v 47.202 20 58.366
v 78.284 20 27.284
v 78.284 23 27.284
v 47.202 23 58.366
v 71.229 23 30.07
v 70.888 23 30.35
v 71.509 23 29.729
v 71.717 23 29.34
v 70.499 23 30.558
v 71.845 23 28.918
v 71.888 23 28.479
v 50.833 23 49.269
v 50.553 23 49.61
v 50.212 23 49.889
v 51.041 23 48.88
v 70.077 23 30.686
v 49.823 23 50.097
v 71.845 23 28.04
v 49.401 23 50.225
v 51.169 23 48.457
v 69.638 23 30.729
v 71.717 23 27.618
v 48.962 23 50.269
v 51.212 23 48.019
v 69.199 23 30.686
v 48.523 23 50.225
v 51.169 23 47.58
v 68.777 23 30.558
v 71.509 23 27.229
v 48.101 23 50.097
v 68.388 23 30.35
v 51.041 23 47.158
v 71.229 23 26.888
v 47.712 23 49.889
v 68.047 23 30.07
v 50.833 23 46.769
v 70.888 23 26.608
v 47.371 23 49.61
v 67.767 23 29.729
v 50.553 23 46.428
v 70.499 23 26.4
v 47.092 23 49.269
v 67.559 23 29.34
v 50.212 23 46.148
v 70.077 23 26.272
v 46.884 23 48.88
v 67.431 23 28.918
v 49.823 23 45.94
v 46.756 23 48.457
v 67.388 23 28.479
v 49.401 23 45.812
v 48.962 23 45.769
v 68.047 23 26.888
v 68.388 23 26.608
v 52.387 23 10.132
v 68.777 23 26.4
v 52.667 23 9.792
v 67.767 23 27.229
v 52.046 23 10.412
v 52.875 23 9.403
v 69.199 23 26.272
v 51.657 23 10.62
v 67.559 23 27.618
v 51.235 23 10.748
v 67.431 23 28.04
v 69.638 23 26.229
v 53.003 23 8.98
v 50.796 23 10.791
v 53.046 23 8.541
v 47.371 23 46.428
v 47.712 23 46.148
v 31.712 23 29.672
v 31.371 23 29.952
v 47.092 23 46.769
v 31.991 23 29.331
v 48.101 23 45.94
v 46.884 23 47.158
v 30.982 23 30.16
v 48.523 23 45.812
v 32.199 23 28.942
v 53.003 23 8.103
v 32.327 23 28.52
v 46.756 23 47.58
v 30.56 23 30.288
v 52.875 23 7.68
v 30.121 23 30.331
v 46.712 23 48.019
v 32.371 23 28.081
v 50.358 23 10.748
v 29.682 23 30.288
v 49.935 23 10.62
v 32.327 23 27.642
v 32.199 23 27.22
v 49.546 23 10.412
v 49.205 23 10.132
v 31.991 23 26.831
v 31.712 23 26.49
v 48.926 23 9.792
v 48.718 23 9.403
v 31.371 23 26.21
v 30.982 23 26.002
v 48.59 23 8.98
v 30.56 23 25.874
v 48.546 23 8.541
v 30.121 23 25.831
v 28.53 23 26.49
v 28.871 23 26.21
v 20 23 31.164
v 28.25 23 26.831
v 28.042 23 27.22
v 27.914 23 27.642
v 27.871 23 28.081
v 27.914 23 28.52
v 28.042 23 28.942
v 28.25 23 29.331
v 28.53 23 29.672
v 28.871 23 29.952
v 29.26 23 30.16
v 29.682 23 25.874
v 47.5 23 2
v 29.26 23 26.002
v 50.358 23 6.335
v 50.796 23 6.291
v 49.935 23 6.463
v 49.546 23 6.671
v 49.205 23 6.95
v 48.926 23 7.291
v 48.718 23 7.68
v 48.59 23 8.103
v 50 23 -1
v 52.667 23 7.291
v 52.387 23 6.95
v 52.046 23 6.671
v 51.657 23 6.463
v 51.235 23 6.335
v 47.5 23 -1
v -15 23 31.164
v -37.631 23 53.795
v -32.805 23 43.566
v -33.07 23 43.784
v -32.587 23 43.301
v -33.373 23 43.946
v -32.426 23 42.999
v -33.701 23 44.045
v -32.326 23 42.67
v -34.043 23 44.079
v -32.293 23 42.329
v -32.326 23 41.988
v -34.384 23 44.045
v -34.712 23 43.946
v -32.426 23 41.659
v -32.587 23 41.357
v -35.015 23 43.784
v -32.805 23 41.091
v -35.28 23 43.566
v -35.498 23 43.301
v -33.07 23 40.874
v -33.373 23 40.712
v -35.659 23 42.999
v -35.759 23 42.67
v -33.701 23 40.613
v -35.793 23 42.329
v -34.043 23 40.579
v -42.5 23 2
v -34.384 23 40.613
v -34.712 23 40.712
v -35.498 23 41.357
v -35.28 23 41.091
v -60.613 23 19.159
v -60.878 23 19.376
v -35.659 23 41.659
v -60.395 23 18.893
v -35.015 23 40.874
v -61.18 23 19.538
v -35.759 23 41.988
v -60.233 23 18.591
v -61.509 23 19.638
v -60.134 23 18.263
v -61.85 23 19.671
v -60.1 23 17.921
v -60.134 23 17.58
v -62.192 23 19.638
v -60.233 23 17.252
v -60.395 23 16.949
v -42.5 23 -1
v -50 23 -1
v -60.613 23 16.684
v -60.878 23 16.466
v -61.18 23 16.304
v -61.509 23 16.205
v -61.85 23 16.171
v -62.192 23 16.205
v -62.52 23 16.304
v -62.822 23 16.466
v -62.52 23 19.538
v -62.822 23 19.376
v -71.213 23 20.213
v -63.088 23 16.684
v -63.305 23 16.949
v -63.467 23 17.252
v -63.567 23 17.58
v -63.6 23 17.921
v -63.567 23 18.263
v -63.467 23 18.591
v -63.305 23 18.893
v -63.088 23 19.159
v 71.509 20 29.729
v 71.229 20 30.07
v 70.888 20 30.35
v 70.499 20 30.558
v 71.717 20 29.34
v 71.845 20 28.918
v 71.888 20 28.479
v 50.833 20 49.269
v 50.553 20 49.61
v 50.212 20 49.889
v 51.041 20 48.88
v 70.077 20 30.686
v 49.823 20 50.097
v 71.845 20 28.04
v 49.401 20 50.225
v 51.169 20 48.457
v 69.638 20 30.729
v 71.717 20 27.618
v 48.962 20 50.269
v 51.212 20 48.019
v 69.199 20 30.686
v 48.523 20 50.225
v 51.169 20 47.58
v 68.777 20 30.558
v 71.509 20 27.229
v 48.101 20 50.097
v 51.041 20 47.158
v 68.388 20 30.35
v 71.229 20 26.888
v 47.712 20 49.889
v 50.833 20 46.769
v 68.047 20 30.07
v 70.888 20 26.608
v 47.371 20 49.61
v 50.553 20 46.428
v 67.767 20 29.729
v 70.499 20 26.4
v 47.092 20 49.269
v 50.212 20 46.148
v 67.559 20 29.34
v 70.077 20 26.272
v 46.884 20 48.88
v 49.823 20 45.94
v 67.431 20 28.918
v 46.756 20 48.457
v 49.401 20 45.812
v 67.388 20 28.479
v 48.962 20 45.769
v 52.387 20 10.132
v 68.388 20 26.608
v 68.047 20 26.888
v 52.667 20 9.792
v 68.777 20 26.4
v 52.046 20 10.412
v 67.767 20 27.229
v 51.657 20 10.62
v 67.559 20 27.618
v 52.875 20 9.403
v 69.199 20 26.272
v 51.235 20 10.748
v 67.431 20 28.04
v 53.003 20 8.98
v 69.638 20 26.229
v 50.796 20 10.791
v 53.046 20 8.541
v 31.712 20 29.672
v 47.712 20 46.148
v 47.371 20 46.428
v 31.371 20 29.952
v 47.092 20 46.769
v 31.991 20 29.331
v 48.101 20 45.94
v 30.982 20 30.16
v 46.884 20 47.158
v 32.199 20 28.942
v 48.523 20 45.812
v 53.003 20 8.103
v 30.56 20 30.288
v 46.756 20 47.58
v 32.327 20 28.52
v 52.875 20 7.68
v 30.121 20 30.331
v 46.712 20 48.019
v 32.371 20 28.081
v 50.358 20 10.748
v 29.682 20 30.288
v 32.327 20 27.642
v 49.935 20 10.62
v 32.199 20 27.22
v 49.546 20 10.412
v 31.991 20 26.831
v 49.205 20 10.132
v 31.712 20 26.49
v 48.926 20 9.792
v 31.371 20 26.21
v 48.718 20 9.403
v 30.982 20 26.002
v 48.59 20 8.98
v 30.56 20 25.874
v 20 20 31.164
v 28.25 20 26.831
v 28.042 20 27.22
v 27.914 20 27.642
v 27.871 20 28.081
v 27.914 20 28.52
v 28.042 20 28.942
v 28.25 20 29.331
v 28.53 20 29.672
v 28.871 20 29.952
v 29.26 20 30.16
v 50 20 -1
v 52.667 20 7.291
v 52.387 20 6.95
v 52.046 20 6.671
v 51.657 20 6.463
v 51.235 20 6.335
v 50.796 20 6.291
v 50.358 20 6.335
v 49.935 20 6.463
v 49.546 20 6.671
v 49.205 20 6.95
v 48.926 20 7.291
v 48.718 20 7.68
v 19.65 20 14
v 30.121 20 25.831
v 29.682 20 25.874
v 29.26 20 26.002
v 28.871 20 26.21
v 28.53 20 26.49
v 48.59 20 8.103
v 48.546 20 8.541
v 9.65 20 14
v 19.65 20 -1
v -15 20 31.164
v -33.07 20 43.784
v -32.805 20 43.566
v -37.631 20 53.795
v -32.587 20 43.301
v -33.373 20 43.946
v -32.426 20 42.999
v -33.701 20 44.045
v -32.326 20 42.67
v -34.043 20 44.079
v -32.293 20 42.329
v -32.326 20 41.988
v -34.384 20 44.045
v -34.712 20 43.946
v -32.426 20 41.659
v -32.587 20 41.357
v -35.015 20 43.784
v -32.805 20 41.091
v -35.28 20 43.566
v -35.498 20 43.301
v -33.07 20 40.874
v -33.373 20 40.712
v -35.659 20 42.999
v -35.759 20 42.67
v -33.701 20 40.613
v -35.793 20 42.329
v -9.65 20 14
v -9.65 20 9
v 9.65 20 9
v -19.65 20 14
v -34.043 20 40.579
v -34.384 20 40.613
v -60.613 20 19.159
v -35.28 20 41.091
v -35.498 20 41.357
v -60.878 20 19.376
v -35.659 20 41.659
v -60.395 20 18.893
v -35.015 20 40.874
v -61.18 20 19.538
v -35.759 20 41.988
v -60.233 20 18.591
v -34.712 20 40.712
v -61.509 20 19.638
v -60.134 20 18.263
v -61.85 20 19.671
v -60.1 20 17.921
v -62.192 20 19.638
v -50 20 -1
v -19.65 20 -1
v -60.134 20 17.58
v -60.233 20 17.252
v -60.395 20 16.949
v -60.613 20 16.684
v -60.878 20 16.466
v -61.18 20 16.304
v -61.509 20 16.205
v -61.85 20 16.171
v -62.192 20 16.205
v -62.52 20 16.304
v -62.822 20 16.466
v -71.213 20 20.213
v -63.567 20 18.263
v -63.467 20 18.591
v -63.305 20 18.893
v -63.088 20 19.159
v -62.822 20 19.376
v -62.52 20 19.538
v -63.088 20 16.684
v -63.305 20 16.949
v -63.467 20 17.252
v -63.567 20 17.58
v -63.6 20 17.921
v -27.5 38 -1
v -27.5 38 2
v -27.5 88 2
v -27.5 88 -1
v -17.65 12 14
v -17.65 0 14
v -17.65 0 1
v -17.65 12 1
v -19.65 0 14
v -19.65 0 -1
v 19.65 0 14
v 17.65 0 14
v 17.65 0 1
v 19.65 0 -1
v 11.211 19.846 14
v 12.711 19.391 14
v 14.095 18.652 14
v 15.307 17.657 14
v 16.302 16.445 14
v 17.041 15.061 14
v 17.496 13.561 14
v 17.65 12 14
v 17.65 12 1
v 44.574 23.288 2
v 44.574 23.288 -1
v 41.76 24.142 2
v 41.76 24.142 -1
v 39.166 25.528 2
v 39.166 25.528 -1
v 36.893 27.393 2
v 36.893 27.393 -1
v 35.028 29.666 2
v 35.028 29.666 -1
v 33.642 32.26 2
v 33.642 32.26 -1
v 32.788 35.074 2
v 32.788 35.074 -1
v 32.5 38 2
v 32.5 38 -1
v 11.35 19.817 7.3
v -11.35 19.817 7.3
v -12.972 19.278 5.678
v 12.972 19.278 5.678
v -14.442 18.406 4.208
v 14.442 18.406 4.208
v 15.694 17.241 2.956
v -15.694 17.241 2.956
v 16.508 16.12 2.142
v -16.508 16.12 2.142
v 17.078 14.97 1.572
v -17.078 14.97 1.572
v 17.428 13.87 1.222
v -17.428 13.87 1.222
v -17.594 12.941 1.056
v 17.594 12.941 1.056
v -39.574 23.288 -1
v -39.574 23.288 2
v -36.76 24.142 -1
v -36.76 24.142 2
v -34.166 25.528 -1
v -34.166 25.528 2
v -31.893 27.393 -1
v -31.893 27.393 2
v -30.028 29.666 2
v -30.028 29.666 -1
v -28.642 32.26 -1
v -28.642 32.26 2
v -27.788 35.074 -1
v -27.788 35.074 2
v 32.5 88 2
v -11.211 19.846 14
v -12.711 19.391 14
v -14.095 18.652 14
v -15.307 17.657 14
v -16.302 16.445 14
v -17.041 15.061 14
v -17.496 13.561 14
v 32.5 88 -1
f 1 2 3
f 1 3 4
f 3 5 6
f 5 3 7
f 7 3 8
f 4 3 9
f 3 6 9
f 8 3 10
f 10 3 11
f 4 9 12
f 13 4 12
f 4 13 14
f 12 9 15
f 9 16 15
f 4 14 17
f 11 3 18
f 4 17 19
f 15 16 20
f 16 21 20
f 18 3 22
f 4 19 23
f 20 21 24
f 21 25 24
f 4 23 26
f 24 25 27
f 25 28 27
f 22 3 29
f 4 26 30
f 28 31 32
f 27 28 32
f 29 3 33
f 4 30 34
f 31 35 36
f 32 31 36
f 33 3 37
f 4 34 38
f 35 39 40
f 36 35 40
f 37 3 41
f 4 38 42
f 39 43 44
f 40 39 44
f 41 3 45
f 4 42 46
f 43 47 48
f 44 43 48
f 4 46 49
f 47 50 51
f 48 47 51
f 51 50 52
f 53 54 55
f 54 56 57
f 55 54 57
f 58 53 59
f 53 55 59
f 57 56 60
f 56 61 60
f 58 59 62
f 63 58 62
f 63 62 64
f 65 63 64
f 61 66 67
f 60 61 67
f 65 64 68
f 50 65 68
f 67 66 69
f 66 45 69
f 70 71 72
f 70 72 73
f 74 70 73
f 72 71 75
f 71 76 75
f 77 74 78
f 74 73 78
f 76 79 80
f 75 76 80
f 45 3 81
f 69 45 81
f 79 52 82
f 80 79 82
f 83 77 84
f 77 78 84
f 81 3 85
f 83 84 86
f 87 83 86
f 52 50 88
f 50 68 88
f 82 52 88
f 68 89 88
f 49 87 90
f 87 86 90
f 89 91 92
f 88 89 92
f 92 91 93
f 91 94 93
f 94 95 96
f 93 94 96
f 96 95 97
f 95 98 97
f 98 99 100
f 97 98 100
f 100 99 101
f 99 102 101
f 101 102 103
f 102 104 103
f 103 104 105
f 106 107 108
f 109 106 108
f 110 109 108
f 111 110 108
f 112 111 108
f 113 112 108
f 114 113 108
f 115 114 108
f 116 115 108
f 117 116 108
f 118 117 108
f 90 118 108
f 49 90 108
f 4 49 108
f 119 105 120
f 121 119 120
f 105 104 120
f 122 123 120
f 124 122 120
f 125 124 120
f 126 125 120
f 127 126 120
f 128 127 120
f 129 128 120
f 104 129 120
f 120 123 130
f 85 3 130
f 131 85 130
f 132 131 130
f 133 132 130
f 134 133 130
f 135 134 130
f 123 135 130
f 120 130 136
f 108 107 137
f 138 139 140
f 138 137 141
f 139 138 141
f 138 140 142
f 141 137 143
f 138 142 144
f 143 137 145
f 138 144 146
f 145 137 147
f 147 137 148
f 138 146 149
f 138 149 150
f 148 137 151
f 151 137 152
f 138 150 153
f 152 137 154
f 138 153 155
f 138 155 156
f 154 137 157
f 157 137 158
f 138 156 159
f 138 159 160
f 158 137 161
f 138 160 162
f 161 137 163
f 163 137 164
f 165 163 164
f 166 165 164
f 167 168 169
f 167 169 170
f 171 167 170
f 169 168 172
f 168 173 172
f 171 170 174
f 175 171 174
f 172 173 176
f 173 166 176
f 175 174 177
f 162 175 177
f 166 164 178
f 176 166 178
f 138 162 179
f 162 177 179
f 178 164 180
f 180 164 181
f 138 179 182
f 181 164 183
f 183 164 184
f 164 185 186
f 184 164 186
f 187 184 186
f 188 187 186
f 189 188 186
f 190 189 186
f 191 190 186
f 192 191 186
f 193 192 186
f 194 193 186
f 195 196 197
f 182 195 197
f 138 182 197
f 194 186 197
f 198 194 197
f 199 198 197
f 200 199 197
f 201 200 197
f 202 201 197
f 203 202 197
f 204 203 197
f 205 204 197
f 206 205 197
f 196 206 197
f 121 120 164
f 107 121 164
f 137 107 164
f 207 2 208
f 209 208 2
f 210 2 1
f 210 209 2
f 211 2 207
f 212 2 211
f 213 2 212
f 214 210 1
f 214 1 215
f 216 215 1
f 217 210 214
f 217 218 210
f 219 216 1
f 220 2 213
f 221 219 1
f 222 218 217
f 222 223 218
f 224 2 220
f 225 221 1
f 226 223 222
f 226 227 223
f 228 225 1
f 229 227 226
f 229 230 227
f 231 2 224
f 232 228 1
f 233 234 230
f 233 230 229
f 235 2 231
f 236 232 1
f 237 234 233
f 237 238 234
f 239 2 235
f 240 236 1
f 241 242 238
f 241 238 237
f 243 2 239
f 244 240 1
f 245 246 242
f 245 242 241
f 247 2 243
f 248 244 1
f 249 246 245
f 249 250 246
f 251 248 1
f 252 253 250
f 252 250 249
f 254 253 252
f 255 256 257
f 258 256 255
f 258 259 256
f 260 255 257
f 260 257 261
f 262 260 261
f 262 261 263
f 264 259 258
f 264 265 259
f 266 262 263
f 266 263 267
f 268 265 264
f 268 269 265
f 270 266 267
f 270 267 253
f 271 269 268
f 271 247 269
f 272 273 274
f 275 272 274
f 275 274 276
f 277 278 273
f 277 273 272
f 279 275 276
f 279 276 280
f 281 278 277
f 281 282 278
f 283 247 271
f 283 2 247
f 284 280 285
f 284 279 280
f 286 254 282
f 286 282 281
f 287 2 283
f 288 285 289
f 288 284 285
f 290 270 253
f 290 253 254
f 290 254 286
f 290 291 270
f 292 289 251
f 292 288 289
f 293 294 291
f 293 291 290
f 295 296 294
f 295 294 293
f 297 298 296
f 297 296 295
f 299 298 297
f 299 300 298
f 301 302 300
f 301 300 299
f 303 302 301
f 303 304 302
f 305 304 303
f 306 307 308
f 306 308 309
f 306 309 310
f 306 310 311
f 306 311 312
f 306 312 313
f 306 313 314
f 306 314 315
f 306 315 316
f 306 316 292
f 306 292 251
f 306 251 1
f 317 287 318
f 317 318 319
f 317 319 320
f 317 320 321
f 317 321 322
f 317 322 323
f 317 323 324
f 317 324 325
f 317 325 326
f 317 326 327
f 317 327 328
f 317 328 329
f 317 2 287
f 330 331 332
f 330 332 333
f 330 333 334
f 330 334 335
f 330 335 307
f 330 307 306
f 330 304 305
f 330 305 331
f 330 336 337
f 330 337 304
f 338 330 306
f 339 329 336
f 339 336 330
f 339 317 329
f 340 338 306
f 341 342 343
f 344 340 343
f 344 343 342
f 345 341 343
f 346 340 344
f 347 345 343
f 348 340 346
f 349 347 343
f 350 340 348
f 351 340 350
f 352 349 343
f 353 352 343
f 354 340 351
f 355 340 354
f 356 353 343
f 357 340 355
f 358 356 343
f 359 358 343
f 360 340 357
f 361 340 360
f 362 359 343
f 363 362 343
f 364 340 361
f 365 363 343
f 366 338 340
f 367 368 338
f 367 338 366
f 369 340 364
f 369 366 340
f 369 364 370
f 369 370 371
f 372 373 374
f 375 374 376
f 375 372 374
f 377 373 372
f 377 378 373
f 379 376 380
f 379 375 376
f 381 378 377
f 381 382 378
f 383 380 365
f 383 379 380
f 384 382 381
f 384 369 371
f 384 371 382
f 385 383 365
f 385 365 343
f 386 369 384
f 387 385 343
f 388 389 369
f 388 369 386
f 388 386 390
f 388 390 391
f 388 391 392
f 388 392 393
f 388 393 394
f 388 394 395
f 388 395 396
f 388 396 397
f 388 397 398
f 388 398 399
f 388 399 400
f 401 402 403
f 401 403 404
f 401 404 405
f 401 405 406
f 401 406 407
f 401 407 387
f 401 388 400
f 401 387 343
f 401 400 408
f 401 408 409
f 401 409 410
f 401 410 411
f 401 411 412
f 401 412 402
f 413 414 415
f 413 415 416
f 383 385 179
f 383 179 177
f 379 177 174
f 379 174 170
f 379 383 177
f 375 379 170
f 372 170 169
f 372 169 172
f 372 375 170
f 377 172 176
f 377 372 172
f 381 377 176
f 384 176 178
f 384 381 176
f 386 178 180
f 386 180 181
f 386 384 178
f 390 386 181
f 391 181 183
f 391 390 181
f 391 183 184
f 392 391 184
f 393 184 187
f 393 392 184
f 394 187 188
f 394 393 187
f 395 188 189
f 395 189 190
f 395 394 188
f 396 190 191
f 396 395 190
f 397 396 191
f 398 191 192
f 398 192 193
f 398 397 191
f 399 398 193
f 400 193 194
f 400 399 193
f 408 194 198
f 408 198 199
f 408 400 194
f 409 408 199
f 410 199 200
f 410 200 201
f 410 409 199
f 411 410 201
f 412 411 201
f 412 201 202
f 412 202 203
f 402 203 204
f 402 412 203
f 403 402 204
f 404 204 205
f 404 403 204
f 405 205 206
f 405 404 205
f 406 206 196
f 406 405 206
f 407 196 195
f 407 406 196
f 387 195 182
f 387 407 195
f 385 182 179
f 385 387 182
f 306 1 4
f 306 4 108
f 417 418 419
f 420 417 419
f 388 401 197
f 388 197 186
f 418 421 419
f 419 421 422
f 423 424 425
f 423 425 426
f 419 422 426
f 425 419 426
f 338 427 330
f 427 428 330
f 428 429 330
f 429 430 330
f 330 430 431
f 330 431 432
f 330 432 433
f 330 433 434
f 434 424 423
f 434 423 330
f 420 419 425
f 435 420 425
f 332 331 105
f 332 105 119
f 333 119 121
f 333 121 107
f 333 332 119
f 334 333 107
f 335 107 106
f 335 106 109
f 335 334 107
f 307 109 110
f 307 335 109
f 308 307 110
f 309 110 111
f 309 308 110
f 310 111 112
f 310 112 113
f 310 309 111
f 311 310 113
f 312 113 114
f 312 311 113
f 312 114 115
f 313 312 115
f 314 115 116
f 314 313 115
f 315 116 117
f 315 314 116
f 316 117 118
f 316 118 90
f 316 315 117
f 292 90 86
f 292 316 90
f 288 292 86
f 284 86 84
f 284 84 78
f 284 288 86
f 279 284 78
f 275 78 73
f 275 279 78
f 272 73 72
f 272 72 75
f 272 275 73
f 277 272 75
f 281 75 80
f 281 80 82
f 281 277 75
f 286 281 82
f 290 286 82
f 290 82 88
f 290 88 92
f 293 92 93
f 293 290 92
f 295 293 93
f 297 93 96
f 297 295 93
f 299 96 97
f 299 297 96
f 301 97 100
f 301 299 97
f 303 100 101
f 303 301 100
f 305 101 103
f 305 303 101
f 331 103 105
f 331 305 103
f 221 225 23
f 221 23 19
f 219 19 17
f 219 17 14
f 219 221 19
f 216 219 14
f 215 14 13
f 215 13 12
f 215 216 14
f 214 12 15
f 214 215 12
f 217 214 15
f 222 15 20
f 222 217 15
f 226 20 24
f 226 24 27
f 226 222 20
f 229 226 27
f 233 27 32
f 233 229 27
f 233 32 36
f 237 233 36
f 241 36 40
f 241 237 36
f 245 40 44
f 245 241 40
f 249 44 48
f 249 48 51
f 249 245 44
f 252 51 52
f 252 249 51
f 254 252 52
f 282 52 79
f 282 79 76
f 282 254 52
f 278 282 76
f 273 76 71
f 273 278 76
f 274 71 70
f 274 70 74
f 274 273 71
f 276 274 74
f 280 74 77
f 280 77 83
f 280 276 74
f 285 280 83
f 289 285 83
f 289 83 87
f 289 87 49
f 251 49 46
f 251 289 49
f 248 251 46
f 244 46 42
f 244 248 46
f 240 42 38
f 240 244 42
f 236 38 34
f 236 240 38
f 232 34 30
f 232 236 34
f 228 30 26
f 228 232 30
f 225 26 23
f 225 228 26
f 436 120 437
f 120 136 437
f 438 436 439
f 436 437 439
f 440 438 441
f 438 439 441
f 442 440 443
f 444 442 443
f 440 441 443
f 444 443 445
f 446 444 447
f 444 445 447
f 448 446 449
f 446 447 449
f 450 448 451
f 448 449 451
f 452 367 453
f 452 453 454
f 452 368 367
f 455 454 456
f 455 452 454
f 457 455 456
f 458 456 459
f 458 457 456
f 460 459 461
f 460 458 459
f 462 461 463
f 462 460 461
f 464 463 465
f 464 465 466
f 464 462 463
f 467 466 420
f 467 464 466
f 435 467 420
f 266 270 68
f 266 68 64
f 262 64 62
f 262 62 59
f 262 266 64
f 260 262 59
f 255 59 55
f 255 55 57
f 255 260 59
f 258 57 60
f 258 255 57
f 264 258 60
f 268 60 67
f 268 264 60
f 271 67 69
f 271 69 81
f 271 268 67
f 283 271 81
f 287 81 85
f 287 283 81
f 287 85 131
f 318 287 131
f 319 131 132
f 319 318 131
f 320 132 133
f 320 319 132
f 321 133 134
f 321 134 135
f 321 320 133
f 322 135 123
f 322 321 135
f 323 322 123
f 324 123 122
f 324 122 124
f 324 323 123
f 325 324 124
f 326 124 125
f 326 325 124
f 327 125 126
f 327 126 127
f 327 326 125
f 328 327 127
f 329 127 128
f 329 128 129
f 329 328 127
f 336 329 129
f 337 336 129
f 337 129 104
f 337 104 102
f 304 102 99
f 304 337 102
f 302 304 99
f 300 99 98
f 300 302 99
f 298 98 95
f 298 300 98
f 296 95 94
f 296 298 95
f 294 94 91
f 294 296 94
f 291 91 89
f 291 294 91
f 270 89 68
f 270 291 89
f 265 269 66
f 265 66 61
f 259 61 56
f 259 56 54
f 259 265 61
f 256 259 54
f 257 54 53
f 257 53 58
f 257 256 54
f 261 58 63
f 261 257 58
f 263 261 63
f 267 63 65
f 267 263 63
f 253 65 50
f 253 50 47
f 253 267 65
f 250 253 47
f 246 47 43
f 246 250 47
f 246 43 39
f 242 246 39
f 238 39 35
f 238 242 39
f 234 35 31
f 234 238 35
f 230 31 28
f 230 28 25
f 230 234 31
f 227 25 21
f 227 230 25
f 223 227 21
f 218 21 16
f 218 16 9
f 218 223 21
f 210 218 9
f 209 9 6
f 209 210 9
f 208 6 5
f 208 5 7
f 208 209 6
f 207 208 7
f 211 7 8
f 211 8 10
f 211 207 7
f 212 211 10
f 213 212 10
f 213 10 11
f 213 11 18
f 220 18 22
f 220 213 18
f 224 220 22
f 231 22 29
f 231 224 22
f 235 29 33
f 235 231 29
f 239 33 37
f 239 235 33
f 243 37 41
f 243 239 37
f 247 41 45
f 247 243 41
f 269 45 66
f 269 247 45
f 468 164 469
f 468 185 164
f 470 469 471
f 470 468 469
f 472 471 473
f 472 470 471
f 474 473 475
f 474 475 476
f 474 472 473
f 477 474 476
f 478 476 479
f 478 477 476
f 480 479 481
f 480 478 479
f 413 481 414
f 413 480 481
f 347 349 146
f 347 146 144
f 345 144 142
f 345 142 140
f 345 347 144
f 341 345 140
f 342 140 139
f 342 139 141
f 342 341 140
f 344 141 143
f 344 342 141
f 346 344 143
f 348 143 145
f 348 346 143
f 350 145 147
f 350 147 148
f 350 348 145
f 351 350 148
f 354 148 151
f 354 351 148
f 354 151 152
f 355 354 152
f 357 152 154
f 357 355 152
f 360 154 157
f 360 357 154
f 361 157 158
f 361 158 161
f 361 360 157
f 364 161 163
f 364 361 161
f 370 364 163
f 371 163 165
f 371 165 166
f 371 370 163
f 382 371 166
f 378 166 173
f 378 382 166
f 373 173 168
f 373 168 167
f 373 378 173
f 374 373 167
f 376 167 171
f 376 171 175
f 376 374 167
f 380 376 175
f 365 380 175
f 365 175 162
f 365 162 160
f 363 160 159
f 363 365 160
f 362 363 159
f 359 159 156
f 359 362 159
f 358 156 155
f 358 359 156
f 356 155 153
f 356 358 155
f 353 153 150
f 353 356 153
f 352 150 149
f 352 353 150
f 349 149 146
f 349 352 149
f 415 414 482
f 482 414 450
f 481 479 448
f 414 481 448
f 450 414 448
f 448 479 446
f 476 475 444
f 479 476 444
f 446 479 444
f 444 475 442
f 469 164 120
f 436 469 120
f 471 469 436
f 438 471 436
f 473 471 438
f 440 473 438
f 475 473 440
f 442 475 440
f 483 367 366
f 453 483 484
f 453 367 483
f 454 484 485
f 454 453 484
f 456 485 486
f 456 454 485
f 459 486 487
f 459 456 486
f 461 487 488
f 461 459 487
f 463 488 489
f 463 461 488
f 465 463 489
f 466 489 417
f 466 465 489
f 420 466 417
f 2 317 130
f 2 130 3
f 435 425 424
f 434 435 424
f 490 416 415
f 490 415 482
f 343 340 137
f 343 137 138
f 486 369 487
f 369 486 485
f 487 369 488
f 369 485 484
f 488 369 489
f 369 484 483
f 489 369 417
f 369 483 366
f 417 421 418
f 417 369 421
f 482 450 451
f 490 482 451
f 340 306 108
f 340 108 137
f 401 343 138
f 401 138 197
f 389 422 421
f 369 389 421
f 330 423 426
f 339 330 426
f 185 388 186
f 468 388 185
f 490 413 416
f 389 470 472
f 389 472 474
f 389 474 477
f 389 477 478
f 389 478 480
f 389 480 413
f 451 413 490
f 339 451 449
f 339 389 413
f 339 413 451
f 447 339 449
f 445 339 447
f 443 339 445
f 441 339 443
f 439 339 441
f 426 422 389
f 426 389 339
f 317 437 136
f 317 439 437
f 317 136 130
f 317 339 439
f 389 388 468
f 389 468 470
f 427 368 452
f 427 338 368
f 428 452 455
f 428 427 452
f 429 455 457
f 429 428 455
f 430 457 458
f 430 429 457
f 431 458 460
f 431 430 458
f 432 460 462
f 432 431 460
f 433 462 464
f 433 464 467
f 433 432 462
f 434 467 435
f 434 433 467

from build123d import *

# Parameters (mm, degrees)
BOSS_EXTRUDE1_DEPTH = 20
SKETCH2_R           = 1.75
SKETCH2_R_2         = 2.25
BOSS_EXTRUDE2_DEPTH = 3
FILLET1_R           = 8
SKETCH3_W           = 60
SKETCH3_H           = 3
BOSS_EXTRUDE3_DEPTH = 65
FILLET2_R           = 15


with BuildPart() as part:
    # Sketch1 → Boss-Extrude1 (new body)
    with BuildSketch(Plane(origin=(0, 0, 0), x_dir=(1, 0, 0), z_dir=(0, 1, 0))):
        Polygon((-17.65, -1), (17.65, -1), (17.65, -14), (19.65, -14), (19.65, -1), (19.65, 1), (-19.65, 1), (-19.65, -1), (-19.65, -14), (-17.65, -14), align=None)
    extrude(amount=BOSS_EXTRUDE1_DEPTH)

    # Sketch2 → Boss-Extrude2 (add)
    with BuildSketch(Plane(origin=(0, 20, 0), x_dir=(1, 0, 0), z_dir=(0, 1, 0))):
        Polygon((-50, 1), (50, 1), (78.284271247, -27.284271247), (47.202085299, -58.366457196), (20, -31.164371897), (-15, -31.164371897), (-37.631017487, -53.795389384), (-71.213203436, -20.213203436), align=None)
        with Locations(Location((-61.850146281, -17.921214092, 0), (0, 0, 270))):
            Circle(SKETCH2_R, mode=Mode.SUBTRACT)
        with Locations(Location((-34.042532687, -42.328930623, 0), (0, 0, 270))):
            Circle(SKETCH2_R, mode=Mode.SUBTRACT)
        with Locations(Location((48.962338505, -48.018545271, 0), (0, 0, 270))):
            Circle(SKETCH2_R_2, mode=Mode.SUBTRACT)
        with Locations(Location((69.638225821, -28.478934535, 0), (0, 0, 90))):
            Circle(SKETCH2_R_2, mode=Mode.SUBTRACT)
        with Locations(Location((50.796458326, -8.541471766, 0), (0, 0, 270))):
            Circle(SKETCH2_R_2, mode=Mode.SUBTRACT)
        with Locations(Location((30.12057101, -28.081082501, 0), (0, 0, 90))):
            Circle(SKETCH2_R_2, mode=Mode.SUBTRACT)
    extrude(amount=BOSS_EXTRUDE2_DEPTH)

    # Fillet1
    fillet1_edges = [part.edges().sort_by_distance(p)[0] for p in [
        (-17.65, 20, 7.5),
        (0, 20, 1),
        (17.65, 20, 7.5),
    ]]
    fillet(fillet1_edges, radius=FILLET1_R)

    # Sketch3 → Boss-Extrude3 (add)
    with BuildSketch(Plane(origin=(0, 23, 0), x_dir=(1, 0, 0), z_dir=(0, 1, 0))):
        with Locations((2.5, -0.5)):
            Rectangle(SKETCH3_W, SKETCH3_H)
    extrude(amount=BOSS_EXTRUDE3_DEPTH)

    # Fillet2
    fillet2_edges = [part.edges().sort_by_distance(p)[0] for p in [
        (32.5, 23, 0.5),
        (-27.5, 23, 0.5),
    ]]
    fillet(fillet2_edges, radius=FILLET2_R)


solid = part.part
